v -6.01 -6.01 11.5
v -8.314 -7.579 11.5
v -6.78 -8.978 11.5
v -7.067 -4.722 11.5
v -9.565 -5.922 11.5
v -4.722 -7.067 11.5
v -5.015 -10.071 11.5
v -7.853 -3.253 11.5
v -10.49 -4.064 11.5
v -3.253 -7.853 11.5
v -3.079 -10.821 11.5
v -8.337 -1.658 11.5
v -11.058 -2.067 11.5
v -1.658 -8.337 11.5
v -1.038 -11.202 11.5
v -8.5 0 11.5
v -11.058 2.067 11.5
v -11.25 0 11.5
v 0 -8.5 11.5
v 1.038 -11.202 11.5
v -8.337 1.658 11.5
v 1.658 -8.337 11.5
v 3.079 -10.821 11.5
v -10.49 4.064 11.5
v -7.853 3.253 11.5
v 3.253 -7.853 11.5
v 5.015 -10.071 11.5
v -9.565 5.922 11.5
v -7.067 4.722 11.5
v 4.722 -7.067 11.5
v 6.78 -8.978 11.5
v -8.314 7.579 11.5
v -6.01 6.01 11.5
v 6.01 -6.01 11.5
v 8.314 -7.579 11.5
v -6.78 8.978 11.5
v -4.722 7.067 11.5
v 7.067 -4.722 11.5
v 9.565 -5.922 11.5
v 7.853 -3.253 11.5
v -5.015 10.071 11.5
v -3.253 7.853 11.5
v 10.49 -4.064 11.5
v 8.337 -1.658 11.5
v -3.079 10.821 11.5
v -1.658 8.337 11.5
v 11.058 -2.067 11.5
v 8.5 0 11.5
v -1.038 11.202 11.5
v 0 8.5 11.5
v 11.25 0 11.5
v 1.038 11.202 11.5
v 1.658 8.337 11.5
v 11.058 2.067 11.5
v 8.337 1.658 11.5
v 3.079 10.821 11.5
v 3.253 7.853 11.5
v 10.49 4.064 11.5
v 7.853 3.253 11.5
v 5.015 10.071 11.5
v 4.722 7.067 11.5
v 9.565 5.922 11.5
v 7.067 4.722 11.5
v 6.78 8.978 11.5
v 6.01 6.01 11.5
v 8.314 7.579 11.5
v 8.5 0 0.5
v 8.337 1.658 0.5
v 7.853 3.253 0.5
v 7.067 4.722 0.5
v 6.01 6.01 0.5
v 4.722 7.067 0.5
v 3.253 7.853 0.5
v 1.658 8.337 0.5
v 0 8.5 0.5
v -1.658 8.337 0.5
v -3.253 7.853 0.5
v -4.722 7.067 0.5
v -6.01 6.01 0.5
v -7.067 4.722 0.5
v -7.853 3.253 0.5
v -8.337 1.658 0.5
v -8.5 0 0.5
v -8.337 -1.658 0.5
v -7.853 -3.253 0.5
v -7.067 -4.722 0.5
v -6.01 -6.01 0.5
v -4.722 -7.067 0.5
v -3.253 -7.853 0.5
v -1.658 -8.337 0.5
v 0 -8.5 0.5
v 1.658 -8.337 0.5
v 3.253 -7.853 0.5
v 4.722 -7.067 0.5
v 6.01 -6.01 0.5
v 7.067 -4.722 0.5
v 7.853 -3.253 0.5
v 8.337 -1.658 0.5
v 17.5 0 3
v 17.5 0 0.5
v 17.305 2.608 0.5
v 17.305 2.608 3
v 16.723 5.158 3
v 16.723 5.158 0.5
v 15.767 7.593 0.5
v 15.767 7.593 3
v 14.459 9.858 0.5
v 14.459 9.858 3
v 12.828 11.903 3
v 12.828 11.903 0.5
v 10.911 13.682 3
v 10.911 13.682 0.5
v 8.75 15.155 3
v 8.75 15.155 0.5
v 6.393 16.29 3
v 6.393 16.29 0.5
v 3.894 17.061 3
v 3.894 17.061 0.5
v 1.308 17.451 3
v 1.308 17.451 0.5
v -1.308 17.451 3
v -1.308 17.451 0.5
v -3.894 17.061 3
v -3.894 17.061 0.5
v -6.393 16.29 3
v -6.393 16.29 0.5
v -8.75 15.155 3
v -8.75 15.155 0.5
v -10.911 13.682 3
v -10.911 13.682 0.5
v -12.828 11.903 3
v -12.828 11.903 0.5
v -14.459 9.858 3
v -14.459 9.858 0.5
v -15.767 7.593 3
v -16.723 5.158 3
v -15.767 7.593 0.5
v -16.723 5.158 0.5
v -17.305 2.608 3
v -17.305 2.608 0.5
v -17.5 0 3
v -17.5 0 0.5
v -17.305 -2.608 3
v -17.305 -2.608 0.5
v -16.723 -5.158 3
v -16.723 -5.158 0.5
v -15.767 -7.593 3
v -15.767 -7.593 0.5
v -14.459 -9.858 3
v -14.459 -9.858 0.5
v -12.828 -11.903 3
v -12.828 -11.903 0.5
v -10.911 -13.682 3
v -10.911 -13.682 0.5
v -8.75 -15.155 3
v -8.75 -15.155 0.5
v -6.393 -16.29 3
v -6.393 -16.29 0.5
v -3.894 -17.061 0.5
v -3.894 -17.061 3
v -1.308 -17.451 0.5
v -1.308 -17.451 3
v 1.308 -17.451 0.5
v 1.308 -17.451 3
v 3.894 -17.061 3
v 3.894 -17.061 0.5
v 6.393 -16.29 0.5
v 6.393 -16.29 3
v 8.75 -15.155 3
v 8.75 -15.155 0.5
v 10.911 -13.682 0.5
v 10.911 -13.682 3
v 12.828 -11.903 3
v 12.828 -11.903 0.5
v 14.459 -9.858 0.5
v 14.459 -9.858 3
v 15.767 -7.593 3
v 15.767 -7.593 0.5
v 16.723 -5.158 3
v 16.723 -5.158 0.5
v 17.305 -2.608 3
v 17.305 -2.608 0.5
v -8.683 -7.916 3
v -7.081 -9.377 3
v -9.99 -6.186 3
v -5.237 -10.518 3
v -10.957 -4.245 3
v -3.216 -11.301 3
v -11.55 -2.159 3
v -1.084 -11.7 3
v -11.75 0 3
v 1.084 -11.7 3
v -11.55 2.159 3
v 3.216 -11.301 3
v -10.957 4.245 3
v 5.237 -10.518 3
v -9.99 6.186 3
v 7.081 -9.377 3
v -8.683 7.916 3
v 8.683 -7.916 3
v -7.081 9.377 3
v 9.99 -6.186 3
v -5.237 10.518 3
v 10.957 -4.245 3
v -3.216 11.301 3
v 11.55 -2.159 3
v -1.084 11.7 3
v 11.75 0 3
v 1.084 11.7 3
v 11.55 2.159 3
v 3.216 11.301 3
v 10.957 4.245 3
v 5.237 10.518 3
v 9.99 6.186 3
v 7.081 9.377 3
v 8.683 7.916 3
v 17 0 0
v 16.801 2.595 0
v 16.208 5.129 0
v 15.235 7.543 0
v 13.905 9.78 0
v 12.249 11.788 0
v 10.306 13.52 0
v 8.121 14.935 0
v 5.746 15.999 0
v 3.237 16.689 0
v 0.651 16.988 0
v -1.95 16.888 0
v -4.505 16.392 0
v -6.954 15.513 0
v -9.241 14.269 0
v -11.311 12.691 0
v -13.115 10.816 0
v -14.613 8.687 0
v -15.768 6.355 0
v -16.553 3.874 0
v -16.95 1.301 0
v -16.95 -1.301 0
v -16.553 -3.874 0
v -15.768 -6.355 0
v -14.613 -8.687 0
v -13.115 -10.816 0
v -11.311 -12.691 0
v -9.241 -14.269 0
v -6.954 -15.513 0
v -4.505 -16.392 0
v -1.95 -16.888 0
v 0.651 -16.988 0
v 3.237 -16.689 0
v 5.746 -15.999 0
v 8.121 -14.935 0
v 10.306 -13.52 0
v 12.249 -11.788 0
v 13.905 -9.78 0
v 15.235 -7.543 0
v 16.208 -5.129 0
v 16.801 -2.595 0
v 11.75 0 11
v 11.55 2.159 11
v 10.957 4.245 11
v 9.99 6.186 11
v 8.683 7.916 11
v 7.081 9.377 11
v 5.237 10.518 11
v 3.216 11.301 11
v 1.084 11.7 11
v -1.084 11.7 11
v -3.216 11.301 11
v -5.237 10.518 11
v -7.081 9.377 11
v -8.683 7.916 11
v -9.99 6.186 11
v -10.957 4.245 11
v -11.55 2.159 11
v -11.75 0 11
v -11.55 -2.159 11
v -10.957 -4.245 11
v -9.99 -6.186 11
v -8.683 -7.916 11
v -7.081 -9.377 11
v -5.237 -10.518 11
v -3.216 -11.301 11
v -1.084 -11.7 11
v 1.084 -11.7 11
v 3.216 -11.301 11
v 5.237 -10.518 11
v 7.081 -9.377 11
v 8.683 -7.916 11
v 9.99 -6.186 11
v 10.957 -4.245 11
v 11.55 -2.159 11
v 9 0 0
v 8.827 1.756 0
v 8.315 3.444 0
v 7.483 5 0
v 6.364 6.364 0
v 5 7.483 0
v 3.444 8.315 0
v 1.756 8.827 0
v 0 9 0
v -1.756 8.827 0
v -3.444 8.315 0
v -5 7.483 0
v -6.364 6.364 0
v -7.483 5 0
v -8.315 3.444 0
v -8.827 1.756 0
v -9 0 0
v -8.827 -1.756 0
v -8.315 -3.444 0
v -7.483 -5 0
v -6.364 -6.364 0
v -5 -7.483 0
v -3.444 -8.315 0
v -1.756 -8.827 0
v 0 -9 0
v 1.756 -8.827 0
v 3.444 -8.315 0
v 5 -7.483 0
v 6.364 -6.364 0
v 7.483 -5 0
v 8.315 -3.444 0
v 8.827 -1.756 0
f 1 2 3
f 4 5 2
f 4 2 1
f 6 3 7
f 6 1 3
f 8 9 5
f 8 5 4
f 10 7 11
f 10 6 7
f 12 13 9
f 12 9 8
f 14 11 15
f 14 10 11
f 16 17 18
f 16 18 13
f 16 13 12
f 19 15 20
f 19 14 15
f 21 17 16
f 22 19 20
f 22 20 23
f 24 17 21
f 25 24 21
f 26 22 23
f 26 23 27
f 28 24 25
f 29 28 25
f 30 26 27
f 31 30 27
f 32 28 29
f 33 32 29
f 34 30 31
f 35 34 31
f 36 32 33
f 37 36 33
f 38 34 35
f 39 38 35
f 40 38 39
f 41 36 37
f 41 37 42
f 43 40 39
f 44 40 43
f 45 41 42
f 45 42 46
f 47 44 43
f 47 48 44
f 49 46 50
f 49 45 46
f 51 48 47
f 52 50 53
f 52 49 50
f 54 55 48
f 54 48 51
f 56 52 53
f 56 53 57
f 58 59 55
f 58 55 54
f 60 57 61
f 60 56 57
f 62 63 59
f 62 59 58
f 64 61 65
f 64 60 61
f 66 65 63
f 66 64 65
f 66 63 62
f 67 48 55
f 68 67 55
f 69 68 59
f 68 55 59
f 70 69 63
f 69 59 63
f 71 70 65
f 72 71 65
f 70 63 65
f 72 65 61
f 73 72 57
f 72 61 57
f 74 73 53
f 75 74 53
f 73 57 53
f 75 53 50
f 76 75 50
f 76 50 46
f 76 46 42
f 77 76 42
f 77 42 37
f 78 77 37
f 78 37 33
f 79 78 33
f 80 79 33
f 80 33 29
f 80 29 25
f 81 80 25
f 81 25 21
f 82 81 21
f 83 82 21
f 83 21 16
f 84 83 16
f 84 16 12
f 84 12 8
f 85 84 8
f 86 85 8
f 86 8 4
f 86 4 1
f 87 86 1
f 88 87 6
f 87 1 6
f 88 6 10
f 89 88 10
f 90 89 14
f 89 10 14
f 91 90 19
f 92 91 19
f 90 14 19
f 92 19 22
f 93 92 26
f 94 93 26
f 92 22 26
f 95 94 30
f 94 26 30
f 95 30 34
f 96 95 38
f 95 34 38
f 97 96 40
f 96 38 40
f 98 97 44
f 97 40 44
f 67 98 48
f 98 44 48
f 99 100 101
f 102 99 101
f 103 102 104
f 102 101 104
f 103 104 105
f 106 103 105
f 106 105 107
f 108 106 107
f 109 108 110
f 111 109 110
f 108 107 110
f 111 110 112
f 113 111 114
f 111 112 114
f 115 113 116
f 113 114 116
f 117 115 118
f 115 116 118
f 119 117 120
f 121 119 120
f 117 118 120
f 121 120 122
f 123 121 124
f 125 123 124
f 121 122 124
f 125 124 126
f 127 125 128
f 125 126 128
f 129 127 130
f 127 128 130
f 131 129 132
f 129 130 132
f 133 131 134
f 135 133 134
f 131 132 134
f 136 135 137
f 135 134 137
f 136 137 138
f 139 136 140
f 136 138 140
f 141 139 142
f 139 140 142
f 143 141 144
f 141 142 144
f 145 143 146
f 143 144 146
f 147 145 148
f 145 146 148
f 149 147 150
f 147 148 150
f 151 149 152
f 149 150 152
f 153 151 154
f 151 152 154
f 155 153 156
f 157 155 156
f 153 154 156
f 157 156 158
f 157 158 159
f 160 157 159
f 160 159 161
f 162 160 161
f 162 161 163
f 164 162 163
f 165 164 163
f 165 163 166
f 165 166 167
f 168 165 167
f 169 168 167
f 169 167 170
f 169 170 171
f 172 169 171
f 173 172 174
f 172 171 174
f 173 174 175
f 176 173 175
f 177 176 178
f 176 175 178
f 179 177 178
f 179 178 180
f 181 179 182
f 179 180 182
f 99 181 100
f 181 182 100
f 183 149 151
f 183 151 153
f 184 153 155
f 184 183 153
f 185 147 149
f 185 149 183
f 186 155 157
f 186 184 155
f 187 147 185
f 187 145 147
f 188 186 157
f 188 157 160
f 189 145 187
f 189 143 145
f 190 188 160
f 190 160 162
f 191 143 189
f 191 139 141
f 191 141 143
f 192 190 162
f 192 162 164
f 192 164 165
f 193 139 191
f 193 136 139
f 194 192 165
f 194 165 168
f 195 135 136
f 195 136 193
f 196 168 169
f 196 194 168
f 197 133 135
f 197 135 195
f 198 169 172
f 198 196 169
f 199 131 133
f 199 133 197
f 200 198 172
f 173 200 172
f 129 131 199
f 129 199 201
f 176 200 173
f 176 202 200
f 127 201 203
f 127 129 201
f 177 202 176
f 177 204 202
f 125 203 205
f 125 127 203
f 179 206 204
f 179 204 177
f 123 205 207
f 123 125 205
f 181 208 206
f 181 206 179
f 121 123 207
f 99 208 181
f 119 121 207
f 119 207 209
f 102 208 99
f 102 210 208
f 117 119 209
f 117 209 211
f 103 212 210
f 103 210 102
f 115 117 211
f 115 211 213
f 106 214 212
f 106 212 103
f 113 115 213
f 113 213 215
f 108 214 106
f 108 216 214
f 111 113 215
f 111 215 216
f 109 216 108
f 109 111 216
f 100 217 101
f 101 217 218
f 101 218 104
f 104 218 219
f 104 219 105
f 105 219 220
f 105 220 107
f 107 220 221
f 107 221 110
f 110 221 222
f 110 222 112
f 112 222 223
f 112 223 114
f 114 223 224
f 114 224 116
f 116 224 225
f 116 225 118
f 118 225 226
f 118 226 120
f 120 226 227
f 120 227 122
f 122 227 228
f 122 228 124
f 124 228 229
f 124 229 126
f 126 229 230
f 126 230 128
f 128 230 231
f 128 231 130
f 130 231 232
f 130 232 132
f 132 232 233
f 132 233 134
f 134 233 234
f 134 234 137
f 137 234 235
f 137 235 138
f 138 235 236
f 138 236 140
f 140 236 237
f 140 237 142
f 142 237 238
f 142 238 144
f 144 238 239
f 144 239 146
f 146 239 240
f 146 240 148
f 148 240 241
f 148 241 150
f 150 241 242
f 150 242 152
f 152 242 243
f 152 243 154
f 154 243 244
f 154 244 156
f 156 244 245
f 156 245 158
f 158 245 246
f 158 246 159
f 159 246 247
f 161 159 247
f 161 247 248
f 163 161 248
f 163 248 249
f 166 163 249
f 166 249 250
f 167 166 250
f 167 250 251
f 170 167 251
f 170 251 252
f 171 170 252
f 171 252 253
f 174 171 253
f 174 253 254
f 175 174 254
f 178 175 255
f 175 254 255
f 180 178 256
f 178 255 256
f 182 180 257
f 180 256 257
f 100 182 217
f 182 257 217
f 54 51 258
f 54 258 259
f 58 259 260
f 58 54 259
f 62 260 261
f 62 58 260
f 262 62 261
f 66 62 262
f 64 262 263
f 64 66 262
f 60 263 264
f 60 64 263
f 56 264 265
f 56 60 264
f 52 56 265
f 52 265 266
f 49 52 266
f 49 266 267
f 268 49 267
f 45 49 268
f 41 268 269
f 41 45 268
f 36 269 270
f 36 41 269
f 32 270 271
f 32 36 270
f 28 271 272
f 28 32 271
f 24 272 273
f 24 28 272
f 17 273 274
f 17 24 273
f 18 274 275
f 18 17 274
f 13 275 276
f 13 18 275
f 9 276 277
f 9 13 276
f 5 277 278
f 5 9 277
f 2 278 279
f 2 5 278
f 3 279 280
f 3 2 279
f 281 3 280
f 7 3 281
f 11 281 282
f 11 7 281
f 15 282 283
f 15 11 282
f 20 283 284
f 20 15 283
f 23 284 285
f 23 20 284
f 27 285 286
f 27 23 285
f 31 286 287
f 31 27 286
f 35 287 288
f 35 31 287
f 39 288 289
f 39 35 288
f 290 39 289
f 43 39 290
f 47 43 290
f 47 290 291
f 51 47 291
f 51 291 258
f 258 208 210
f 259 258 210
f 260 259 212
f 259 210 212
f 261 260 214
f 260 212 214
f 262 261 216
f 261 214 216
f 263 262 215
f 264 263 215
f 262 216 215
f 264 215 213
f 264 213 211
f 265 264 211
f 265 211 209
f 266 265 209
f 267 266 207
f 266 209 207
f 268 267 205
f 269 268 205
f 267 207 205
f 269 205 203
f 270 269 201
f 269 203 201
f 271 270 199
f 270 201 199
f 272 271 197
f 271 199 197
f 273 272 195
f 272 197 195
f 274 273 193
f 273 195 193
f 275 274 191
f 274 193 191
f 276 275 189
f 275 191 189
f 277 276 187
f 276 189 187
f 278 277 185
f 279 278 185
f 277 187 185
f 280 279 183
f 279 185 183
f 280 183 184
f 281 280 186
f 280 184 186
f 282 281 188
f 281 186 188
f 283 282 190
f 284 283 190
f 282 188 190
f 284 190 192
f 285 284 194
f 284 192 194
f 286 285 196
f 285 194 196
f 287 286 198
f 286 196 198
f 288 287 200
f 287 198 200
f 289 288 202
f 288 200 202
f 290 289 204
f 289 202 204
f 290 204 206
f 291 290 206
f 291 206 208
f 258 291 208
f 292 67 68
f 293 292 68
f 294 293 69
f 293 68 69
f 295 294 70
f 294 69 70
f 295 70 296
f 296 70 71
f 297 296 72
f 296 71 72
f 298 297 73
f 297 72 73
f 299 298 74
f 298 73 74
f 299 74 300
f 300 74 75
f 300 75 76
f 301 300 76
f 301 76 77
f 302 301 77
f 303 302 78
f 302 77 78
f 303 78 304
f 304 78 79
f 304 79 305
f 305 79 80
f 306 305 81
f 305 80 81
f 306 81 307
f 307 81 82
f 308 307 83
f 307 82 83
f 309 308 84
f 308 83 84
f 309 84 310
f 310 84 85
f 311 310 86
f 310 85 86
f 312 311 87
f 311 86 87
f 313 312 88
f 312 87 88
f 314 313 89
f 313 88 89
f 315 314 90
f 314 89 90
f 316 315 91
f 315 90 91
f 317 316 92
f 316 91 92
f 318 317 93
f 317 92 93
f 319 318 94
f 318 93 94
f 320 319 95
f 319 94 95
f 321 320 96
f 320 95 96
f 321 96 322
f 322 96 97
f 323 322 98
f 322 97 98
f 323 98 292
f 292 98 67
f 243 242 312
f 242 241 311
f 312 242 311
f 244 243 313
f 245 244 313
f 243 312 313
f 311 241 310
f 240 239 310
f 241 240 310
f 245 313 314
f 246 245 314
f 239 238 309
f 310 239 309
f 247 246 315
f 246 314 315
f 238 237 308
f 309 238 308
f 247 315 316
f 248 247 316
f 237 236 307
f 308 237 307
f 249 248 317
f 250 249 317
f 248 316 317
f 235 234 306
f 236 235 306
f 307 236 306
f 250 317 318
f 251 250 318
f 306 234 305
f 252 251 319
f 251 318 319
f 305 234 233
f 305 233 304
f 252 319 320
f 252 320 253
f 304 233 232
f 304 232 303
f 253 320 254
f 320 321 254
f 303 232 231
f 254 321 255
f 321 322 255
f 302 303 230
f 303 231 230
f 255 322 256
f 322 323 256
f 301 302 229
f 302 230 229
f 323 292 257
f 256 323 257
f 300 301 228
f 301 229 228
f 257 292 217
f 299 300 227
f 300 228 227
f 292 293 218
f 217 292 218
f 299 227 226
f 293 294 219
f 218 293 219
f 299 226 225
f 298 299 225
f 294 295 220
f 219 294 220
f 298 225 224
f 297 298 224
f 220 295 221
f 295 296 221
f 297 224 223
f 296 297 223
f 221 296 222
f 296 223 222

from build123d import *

# Parameters (mm, degrees)
SCHIZZO1_R        = 17.5
ESTRUSIONE1_DEPTH = 3
SCHIZZO2_R        = 11.75
ESTRUSIONE2_DEPTH = 8.5
SCHIZZO3_R        = 8.5
ESTRUSIONE3_DEPTH = 28.290108098
SMUSSO1_SIZE      = 0.5


with BuildPart() as part:
    # Schizzo1 → Estrusione1 (new body)
    with BuildSketch(Plane.XY):
        Circle(SCHIZZO1_R)
    extrude(amount=ESTRUSIONE1_DEPTH)

    # Schizzo2 → Estrusione2 (add)
    with BuildSketch(Plane.XY.offset(3)):
        Circle(SCHIZZO2_R)
    extrude(amount=ESTRUSIONE2_DEPTH)

    # Schizzo3 → Estrusione3 (cut, through all)
    with BuildSketch(Plane.XY.offset(11.5)):
        Circle(SCHIZZO3_R)
    extrude(amount=-ESTRUSIONE3_DEPTH, mode=Mode.SUBTRACT)

    # Smusso1
    smusso1_edges = [part.edges().sort_by_distance(p)[0] for p in [
        (-8.5, 0, 0),
        (-17.5, 0, 0),
        (-11.75, 0, 11.5),
    ]]
    chamfer(smusso1_edges, length=SMUSSO1_SIZE)


solid = part.part
